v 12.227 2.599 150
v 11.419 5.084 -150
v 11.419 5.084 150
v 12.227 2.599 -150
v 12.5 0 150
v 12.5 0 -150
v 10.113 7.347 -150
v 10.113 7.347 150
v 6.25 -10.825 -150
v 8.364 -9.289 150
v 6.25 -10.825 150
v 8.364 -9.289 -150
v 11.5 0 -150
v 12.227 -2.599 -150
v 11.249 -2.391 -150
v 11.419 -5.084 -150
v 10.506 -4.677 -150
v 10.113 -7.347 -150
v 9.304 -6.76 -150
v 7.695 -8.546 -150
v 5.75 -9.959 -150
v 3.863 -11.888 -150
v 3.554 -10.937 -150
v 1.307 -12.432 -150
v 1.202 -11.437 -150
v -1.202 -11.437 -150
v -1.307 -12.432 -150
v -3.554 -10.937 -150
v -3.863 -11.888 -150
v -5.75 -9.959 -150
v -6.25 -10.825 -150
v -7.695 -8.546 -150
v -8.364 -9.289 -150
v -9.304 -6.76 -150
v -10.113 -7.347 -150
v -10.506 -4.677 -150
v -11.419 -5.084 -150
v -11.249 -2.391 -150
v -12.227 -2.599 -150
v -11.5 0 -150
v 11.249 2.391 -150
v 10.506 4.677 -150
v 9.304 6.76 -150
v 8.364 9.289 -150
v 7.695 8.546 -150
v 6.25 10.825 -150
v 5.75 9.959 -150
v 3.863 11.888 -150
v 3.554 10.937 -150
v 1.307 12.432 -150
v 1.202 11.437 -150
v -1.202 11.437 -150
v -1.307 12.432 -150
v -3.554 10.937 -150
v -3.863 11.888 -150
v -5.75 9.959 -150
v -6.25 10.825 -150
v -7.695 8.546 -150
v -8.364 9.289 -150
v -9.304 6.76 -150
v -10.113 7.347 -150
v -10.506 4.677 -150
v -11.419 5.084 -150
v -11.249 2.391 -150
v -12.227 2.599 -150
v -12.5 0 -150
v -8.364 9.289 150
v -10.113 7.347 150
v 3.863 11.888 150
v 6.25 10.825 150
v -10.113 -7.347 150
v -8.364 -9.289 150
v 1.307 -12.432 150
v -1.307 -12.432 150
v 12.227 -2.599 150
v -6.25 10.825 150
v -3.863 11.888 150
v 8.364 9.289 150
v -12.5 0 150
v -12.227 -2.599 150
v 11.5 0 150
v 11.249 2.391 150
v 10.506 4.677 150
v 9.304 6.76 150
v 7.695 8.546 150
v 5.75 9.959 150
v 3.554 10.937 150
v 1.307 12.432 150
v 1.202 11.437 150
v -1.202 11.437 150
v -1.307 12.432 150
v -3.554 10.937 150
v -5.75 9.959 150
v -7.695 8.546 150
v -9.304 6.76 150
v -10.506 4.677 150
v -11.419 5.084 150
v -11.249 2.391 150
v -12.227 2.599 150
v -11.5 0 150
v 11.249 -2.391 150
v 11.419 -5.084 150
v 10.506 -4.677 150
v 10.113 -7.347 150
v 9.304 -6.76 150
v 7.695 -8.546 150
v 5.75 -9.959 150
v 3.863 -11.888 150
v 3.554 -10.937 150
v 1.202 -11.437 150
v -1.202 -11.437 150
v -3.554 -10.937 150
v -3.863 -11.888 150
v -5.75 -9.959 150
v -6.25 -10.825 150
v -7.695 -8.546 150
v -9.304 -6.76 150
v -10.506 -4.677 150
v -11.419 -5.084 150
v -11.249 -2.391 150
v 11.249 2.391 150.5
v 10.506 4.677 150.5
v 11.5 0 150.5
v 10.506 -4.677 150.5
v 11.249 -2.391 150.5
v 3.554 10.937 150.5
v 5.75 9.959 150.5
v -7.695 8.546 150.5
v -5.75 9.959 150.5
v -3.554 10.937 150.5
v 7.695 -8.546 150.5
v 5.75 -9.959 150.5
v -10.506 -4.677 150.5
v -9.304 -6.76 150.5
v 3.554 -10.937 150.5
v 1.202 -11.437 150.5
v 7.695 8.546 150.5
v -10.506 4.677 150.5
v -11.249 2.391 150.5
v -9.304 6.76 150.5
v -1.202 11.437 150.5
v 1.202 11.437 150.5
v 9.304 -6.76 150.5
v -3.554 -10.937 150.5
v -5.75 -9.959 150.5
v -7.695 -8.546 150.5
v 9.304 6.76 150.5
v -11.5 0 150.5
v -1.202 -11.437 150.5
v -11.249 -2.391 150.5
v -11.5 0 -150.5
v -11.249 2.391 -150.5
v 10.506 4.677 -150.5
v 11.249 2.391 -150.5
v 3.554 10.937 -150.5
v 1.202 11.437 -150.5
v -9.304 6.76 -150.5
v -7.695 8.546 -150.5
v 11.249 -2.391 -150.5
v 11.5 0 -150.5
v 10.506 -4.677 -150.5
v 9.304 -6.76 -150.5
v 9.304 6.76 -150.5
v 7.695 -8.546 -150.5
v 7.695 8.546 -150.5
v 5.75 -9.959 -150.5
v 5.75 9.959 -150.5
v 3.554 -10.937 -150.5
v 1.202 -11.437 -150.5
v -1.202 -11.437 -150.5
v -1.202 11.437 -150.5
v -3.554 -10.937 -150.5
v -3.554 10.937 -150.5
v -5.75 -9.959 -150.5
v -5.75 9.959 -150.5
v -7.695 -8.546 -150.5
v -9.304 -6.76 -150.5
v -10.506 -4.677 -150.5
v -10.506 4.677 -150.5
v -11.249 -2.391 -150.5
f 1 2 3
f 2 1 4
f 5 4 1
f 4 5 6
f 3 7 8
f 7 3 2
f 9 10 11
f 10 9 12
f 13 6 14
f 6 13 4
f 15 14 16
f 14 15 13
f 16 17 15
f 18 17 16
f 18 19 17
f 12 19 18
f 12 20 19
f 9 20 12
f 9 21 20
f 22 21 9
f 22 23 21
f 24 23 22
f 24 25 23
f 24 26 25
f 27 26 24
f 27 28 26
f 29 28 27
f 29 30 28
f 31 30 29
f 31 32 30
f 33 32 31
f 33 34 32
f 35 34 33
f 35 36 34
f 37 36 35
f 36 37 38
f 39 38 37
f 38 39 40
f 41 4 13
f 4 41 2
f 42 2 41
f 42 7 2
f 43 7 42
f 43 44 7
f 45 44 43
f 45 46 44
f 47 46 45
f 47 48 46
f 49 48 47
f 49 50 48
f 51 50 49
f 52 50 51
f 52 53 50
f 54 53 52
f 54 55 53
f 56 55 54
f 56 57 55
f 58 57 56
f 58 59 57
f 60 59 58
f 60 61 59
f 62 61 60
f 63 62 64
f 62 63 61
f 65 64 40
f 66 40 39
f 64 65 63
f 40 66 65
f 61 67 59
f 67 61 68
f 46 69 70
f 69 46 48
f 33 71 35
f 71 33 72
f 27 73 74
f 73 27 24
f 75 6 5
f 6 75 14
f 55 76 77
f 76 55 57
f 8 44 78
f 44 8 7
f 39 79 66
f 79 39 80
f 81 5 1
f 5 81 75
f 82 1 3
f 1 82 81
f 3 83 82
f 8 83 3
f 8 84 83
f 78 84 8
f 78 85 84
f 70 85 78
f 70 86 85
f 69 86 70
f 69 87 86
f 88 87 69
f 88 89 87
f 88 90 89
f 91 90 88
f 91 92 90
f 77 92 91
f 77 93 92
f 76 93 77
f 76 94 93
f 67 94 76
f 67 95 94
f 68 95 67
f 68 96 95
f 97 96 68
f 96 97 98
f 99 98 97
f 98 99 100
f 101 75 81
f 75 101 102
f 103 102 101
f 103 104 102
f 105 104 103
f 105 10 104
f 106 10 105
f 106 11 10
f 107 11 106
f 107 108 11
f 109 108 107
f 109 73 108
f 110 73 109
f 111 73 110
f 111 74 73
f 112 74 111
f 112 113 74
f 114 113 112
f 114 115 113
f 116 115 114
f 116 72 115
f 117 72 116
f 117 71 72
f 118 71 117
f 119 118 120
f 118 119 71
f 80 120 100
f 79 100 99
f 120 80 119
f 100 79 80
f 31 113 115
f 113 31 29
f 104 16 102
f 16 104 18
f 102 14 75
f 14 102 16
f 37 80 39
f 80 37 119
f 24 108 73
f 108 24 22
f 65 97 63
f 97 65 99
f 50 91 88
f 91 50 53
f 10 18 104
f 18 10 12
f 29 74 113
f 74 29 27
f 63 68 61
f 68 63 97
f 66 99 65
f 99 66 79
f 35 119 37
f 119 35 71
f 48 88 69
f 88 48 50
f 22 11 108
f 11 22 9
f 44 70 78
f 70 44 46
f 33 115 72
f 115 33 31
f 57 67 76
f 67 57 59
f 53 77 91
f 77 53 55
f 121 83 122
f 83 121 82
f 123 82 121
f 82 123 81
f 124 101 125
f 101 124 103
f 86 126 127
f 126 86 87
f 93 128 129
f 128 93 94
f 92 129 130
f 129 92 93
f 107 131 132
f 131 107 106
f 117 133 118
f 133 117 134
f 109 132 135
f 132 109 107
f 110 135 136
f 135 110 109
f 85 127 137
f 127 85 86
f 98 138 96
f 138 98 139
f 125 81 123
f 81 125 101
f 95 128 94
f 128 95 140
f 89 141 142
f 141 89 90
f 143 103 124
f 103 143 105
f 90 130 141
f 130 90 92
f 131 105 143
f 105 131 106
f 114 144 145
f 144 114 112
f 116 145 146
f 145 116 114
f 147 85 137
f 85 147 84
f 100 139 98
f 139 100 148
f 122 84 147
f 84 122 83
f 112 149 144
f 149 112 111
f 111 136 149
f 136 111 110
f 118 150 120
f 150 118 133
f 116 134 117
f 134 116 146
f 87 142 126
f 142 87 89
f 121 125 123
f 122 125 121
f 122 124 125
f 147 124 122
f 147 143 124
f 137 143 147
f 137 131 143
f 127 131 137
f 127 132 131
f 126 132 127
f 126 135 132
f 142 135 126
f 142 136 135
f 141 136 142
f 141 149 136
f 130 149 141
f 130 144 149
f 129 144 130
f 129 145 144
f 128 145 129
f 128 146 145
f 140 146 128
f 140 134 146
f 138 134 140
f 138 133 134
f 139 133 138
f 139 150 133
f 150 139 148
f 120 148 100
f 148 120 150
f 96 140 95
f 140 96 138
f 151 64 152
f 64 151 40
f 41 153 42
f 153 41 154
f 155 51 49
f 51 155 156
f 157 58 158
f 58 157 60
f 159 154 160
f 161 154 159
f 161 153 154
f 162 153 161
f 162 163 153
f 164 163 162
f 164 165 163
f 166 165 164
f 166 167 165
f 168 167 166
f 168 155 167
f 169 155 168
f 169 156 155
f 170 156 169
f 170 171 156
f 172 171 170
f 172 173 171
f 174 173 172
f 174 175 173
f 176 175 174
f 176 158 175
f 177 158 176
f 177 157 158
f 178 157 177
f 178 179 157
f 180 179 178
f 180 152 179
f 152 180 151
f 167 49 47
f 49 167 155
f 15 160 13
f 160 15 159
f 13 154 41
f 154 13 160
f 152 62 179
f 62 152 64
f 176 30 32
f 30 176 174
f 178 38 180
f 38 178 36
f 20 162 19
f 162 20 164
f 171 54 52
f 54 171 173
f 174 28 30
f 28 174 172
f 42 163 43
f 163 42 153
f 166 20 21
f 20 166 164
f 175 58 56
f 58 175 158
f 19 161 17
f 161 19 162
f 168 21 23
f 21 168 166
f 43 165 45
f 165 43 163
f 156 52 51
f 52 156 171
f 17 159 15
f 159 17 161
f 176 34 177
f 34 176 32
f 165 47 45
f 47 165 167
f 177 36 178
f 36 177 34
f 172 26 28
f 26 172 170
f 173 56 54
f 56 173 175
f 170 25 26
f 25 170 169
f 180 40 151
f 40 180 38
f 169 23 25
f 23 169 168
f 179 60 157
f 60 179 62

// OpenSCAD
// Parameters
tube_length = 300; //[150:600:1]
outer_diameter = 25; //[12.5:50:0.5]
wall_thickness = 2; //[1:5:0.25]
chamfer_size = 0.5; //[0:2:0.1]
cap_thickness = 0.8; //[0.4:2:0.1]
overlap = 1; //[0.5:2:0.1]

// Base Shapes
module tube_body() {
  cylinder(h=tube_length, r=outer_diameter/2, center=true);
}

module hollow_bore() {
  cylinder(h=tube_length + 2*overlap, r=outer_diameter/2 - wall_thickness, center=true);
}

module end_chamfer_top_cut() {
  translate([0, 0, tube_length/2 - (chamfer_size + overlap)/2])
    cylinder(h=chamfer_size + overlap, r1=outer_diameter/2 + overlap, r2=0, center=true);
}

module end_chamfer_bottom_cut() {
  translate([0, 0, -tube_length/2 + (chamfer_size + overlap)/2])
    rotate([180, 0, 0])
    cylinder(h=chamfer_size + overlap, r1=outer_diameter/2 + overlap, r2=0, center=true);
}

module end_cap_top() {
  translate([0, 0, tube_length/2 - cap_thickness/2 + overlap/2])
    cylinder(h=cap_thickness, r=outer_diameter/2 - wall_thickness + overlap, center=true);
}

module end_cap_bottom() {
  translate([0, 0, -tube_length/2 + cap_thickness/2 - overlap/2])
    cylinder(h=cap_thickness, r=outer_diameter/2 - wall_thickness + overlap, center=true);
}

module carbon_fiber_surface_texture() {
  cylinder(h=tube_length, r=outer_diameter/2, center=true);
}

// Operations
module tube_shell_prechamfer() {
  difference() {
    tube_body();
    hollow_bore();
  }
}

module tube_shell_with_chamfers() {
  difference() {
    tube_shell_prechamfer();
    end_chamfer_top_cut();
    end_chamfer_bottom_cut();
  }
}

module tube_with_end_caps() {
  union() {
    tube_shell_with_chamfers();
    end_cap_top();
    end_cap_bottom();
  }
}

module complete_model() {
  union() {
    tube_with_end_caps();
    carbon_fiber_surface_texture();
  }
}

// Final Output
color([0.1, 0.1, 0.1]) complete_model();
